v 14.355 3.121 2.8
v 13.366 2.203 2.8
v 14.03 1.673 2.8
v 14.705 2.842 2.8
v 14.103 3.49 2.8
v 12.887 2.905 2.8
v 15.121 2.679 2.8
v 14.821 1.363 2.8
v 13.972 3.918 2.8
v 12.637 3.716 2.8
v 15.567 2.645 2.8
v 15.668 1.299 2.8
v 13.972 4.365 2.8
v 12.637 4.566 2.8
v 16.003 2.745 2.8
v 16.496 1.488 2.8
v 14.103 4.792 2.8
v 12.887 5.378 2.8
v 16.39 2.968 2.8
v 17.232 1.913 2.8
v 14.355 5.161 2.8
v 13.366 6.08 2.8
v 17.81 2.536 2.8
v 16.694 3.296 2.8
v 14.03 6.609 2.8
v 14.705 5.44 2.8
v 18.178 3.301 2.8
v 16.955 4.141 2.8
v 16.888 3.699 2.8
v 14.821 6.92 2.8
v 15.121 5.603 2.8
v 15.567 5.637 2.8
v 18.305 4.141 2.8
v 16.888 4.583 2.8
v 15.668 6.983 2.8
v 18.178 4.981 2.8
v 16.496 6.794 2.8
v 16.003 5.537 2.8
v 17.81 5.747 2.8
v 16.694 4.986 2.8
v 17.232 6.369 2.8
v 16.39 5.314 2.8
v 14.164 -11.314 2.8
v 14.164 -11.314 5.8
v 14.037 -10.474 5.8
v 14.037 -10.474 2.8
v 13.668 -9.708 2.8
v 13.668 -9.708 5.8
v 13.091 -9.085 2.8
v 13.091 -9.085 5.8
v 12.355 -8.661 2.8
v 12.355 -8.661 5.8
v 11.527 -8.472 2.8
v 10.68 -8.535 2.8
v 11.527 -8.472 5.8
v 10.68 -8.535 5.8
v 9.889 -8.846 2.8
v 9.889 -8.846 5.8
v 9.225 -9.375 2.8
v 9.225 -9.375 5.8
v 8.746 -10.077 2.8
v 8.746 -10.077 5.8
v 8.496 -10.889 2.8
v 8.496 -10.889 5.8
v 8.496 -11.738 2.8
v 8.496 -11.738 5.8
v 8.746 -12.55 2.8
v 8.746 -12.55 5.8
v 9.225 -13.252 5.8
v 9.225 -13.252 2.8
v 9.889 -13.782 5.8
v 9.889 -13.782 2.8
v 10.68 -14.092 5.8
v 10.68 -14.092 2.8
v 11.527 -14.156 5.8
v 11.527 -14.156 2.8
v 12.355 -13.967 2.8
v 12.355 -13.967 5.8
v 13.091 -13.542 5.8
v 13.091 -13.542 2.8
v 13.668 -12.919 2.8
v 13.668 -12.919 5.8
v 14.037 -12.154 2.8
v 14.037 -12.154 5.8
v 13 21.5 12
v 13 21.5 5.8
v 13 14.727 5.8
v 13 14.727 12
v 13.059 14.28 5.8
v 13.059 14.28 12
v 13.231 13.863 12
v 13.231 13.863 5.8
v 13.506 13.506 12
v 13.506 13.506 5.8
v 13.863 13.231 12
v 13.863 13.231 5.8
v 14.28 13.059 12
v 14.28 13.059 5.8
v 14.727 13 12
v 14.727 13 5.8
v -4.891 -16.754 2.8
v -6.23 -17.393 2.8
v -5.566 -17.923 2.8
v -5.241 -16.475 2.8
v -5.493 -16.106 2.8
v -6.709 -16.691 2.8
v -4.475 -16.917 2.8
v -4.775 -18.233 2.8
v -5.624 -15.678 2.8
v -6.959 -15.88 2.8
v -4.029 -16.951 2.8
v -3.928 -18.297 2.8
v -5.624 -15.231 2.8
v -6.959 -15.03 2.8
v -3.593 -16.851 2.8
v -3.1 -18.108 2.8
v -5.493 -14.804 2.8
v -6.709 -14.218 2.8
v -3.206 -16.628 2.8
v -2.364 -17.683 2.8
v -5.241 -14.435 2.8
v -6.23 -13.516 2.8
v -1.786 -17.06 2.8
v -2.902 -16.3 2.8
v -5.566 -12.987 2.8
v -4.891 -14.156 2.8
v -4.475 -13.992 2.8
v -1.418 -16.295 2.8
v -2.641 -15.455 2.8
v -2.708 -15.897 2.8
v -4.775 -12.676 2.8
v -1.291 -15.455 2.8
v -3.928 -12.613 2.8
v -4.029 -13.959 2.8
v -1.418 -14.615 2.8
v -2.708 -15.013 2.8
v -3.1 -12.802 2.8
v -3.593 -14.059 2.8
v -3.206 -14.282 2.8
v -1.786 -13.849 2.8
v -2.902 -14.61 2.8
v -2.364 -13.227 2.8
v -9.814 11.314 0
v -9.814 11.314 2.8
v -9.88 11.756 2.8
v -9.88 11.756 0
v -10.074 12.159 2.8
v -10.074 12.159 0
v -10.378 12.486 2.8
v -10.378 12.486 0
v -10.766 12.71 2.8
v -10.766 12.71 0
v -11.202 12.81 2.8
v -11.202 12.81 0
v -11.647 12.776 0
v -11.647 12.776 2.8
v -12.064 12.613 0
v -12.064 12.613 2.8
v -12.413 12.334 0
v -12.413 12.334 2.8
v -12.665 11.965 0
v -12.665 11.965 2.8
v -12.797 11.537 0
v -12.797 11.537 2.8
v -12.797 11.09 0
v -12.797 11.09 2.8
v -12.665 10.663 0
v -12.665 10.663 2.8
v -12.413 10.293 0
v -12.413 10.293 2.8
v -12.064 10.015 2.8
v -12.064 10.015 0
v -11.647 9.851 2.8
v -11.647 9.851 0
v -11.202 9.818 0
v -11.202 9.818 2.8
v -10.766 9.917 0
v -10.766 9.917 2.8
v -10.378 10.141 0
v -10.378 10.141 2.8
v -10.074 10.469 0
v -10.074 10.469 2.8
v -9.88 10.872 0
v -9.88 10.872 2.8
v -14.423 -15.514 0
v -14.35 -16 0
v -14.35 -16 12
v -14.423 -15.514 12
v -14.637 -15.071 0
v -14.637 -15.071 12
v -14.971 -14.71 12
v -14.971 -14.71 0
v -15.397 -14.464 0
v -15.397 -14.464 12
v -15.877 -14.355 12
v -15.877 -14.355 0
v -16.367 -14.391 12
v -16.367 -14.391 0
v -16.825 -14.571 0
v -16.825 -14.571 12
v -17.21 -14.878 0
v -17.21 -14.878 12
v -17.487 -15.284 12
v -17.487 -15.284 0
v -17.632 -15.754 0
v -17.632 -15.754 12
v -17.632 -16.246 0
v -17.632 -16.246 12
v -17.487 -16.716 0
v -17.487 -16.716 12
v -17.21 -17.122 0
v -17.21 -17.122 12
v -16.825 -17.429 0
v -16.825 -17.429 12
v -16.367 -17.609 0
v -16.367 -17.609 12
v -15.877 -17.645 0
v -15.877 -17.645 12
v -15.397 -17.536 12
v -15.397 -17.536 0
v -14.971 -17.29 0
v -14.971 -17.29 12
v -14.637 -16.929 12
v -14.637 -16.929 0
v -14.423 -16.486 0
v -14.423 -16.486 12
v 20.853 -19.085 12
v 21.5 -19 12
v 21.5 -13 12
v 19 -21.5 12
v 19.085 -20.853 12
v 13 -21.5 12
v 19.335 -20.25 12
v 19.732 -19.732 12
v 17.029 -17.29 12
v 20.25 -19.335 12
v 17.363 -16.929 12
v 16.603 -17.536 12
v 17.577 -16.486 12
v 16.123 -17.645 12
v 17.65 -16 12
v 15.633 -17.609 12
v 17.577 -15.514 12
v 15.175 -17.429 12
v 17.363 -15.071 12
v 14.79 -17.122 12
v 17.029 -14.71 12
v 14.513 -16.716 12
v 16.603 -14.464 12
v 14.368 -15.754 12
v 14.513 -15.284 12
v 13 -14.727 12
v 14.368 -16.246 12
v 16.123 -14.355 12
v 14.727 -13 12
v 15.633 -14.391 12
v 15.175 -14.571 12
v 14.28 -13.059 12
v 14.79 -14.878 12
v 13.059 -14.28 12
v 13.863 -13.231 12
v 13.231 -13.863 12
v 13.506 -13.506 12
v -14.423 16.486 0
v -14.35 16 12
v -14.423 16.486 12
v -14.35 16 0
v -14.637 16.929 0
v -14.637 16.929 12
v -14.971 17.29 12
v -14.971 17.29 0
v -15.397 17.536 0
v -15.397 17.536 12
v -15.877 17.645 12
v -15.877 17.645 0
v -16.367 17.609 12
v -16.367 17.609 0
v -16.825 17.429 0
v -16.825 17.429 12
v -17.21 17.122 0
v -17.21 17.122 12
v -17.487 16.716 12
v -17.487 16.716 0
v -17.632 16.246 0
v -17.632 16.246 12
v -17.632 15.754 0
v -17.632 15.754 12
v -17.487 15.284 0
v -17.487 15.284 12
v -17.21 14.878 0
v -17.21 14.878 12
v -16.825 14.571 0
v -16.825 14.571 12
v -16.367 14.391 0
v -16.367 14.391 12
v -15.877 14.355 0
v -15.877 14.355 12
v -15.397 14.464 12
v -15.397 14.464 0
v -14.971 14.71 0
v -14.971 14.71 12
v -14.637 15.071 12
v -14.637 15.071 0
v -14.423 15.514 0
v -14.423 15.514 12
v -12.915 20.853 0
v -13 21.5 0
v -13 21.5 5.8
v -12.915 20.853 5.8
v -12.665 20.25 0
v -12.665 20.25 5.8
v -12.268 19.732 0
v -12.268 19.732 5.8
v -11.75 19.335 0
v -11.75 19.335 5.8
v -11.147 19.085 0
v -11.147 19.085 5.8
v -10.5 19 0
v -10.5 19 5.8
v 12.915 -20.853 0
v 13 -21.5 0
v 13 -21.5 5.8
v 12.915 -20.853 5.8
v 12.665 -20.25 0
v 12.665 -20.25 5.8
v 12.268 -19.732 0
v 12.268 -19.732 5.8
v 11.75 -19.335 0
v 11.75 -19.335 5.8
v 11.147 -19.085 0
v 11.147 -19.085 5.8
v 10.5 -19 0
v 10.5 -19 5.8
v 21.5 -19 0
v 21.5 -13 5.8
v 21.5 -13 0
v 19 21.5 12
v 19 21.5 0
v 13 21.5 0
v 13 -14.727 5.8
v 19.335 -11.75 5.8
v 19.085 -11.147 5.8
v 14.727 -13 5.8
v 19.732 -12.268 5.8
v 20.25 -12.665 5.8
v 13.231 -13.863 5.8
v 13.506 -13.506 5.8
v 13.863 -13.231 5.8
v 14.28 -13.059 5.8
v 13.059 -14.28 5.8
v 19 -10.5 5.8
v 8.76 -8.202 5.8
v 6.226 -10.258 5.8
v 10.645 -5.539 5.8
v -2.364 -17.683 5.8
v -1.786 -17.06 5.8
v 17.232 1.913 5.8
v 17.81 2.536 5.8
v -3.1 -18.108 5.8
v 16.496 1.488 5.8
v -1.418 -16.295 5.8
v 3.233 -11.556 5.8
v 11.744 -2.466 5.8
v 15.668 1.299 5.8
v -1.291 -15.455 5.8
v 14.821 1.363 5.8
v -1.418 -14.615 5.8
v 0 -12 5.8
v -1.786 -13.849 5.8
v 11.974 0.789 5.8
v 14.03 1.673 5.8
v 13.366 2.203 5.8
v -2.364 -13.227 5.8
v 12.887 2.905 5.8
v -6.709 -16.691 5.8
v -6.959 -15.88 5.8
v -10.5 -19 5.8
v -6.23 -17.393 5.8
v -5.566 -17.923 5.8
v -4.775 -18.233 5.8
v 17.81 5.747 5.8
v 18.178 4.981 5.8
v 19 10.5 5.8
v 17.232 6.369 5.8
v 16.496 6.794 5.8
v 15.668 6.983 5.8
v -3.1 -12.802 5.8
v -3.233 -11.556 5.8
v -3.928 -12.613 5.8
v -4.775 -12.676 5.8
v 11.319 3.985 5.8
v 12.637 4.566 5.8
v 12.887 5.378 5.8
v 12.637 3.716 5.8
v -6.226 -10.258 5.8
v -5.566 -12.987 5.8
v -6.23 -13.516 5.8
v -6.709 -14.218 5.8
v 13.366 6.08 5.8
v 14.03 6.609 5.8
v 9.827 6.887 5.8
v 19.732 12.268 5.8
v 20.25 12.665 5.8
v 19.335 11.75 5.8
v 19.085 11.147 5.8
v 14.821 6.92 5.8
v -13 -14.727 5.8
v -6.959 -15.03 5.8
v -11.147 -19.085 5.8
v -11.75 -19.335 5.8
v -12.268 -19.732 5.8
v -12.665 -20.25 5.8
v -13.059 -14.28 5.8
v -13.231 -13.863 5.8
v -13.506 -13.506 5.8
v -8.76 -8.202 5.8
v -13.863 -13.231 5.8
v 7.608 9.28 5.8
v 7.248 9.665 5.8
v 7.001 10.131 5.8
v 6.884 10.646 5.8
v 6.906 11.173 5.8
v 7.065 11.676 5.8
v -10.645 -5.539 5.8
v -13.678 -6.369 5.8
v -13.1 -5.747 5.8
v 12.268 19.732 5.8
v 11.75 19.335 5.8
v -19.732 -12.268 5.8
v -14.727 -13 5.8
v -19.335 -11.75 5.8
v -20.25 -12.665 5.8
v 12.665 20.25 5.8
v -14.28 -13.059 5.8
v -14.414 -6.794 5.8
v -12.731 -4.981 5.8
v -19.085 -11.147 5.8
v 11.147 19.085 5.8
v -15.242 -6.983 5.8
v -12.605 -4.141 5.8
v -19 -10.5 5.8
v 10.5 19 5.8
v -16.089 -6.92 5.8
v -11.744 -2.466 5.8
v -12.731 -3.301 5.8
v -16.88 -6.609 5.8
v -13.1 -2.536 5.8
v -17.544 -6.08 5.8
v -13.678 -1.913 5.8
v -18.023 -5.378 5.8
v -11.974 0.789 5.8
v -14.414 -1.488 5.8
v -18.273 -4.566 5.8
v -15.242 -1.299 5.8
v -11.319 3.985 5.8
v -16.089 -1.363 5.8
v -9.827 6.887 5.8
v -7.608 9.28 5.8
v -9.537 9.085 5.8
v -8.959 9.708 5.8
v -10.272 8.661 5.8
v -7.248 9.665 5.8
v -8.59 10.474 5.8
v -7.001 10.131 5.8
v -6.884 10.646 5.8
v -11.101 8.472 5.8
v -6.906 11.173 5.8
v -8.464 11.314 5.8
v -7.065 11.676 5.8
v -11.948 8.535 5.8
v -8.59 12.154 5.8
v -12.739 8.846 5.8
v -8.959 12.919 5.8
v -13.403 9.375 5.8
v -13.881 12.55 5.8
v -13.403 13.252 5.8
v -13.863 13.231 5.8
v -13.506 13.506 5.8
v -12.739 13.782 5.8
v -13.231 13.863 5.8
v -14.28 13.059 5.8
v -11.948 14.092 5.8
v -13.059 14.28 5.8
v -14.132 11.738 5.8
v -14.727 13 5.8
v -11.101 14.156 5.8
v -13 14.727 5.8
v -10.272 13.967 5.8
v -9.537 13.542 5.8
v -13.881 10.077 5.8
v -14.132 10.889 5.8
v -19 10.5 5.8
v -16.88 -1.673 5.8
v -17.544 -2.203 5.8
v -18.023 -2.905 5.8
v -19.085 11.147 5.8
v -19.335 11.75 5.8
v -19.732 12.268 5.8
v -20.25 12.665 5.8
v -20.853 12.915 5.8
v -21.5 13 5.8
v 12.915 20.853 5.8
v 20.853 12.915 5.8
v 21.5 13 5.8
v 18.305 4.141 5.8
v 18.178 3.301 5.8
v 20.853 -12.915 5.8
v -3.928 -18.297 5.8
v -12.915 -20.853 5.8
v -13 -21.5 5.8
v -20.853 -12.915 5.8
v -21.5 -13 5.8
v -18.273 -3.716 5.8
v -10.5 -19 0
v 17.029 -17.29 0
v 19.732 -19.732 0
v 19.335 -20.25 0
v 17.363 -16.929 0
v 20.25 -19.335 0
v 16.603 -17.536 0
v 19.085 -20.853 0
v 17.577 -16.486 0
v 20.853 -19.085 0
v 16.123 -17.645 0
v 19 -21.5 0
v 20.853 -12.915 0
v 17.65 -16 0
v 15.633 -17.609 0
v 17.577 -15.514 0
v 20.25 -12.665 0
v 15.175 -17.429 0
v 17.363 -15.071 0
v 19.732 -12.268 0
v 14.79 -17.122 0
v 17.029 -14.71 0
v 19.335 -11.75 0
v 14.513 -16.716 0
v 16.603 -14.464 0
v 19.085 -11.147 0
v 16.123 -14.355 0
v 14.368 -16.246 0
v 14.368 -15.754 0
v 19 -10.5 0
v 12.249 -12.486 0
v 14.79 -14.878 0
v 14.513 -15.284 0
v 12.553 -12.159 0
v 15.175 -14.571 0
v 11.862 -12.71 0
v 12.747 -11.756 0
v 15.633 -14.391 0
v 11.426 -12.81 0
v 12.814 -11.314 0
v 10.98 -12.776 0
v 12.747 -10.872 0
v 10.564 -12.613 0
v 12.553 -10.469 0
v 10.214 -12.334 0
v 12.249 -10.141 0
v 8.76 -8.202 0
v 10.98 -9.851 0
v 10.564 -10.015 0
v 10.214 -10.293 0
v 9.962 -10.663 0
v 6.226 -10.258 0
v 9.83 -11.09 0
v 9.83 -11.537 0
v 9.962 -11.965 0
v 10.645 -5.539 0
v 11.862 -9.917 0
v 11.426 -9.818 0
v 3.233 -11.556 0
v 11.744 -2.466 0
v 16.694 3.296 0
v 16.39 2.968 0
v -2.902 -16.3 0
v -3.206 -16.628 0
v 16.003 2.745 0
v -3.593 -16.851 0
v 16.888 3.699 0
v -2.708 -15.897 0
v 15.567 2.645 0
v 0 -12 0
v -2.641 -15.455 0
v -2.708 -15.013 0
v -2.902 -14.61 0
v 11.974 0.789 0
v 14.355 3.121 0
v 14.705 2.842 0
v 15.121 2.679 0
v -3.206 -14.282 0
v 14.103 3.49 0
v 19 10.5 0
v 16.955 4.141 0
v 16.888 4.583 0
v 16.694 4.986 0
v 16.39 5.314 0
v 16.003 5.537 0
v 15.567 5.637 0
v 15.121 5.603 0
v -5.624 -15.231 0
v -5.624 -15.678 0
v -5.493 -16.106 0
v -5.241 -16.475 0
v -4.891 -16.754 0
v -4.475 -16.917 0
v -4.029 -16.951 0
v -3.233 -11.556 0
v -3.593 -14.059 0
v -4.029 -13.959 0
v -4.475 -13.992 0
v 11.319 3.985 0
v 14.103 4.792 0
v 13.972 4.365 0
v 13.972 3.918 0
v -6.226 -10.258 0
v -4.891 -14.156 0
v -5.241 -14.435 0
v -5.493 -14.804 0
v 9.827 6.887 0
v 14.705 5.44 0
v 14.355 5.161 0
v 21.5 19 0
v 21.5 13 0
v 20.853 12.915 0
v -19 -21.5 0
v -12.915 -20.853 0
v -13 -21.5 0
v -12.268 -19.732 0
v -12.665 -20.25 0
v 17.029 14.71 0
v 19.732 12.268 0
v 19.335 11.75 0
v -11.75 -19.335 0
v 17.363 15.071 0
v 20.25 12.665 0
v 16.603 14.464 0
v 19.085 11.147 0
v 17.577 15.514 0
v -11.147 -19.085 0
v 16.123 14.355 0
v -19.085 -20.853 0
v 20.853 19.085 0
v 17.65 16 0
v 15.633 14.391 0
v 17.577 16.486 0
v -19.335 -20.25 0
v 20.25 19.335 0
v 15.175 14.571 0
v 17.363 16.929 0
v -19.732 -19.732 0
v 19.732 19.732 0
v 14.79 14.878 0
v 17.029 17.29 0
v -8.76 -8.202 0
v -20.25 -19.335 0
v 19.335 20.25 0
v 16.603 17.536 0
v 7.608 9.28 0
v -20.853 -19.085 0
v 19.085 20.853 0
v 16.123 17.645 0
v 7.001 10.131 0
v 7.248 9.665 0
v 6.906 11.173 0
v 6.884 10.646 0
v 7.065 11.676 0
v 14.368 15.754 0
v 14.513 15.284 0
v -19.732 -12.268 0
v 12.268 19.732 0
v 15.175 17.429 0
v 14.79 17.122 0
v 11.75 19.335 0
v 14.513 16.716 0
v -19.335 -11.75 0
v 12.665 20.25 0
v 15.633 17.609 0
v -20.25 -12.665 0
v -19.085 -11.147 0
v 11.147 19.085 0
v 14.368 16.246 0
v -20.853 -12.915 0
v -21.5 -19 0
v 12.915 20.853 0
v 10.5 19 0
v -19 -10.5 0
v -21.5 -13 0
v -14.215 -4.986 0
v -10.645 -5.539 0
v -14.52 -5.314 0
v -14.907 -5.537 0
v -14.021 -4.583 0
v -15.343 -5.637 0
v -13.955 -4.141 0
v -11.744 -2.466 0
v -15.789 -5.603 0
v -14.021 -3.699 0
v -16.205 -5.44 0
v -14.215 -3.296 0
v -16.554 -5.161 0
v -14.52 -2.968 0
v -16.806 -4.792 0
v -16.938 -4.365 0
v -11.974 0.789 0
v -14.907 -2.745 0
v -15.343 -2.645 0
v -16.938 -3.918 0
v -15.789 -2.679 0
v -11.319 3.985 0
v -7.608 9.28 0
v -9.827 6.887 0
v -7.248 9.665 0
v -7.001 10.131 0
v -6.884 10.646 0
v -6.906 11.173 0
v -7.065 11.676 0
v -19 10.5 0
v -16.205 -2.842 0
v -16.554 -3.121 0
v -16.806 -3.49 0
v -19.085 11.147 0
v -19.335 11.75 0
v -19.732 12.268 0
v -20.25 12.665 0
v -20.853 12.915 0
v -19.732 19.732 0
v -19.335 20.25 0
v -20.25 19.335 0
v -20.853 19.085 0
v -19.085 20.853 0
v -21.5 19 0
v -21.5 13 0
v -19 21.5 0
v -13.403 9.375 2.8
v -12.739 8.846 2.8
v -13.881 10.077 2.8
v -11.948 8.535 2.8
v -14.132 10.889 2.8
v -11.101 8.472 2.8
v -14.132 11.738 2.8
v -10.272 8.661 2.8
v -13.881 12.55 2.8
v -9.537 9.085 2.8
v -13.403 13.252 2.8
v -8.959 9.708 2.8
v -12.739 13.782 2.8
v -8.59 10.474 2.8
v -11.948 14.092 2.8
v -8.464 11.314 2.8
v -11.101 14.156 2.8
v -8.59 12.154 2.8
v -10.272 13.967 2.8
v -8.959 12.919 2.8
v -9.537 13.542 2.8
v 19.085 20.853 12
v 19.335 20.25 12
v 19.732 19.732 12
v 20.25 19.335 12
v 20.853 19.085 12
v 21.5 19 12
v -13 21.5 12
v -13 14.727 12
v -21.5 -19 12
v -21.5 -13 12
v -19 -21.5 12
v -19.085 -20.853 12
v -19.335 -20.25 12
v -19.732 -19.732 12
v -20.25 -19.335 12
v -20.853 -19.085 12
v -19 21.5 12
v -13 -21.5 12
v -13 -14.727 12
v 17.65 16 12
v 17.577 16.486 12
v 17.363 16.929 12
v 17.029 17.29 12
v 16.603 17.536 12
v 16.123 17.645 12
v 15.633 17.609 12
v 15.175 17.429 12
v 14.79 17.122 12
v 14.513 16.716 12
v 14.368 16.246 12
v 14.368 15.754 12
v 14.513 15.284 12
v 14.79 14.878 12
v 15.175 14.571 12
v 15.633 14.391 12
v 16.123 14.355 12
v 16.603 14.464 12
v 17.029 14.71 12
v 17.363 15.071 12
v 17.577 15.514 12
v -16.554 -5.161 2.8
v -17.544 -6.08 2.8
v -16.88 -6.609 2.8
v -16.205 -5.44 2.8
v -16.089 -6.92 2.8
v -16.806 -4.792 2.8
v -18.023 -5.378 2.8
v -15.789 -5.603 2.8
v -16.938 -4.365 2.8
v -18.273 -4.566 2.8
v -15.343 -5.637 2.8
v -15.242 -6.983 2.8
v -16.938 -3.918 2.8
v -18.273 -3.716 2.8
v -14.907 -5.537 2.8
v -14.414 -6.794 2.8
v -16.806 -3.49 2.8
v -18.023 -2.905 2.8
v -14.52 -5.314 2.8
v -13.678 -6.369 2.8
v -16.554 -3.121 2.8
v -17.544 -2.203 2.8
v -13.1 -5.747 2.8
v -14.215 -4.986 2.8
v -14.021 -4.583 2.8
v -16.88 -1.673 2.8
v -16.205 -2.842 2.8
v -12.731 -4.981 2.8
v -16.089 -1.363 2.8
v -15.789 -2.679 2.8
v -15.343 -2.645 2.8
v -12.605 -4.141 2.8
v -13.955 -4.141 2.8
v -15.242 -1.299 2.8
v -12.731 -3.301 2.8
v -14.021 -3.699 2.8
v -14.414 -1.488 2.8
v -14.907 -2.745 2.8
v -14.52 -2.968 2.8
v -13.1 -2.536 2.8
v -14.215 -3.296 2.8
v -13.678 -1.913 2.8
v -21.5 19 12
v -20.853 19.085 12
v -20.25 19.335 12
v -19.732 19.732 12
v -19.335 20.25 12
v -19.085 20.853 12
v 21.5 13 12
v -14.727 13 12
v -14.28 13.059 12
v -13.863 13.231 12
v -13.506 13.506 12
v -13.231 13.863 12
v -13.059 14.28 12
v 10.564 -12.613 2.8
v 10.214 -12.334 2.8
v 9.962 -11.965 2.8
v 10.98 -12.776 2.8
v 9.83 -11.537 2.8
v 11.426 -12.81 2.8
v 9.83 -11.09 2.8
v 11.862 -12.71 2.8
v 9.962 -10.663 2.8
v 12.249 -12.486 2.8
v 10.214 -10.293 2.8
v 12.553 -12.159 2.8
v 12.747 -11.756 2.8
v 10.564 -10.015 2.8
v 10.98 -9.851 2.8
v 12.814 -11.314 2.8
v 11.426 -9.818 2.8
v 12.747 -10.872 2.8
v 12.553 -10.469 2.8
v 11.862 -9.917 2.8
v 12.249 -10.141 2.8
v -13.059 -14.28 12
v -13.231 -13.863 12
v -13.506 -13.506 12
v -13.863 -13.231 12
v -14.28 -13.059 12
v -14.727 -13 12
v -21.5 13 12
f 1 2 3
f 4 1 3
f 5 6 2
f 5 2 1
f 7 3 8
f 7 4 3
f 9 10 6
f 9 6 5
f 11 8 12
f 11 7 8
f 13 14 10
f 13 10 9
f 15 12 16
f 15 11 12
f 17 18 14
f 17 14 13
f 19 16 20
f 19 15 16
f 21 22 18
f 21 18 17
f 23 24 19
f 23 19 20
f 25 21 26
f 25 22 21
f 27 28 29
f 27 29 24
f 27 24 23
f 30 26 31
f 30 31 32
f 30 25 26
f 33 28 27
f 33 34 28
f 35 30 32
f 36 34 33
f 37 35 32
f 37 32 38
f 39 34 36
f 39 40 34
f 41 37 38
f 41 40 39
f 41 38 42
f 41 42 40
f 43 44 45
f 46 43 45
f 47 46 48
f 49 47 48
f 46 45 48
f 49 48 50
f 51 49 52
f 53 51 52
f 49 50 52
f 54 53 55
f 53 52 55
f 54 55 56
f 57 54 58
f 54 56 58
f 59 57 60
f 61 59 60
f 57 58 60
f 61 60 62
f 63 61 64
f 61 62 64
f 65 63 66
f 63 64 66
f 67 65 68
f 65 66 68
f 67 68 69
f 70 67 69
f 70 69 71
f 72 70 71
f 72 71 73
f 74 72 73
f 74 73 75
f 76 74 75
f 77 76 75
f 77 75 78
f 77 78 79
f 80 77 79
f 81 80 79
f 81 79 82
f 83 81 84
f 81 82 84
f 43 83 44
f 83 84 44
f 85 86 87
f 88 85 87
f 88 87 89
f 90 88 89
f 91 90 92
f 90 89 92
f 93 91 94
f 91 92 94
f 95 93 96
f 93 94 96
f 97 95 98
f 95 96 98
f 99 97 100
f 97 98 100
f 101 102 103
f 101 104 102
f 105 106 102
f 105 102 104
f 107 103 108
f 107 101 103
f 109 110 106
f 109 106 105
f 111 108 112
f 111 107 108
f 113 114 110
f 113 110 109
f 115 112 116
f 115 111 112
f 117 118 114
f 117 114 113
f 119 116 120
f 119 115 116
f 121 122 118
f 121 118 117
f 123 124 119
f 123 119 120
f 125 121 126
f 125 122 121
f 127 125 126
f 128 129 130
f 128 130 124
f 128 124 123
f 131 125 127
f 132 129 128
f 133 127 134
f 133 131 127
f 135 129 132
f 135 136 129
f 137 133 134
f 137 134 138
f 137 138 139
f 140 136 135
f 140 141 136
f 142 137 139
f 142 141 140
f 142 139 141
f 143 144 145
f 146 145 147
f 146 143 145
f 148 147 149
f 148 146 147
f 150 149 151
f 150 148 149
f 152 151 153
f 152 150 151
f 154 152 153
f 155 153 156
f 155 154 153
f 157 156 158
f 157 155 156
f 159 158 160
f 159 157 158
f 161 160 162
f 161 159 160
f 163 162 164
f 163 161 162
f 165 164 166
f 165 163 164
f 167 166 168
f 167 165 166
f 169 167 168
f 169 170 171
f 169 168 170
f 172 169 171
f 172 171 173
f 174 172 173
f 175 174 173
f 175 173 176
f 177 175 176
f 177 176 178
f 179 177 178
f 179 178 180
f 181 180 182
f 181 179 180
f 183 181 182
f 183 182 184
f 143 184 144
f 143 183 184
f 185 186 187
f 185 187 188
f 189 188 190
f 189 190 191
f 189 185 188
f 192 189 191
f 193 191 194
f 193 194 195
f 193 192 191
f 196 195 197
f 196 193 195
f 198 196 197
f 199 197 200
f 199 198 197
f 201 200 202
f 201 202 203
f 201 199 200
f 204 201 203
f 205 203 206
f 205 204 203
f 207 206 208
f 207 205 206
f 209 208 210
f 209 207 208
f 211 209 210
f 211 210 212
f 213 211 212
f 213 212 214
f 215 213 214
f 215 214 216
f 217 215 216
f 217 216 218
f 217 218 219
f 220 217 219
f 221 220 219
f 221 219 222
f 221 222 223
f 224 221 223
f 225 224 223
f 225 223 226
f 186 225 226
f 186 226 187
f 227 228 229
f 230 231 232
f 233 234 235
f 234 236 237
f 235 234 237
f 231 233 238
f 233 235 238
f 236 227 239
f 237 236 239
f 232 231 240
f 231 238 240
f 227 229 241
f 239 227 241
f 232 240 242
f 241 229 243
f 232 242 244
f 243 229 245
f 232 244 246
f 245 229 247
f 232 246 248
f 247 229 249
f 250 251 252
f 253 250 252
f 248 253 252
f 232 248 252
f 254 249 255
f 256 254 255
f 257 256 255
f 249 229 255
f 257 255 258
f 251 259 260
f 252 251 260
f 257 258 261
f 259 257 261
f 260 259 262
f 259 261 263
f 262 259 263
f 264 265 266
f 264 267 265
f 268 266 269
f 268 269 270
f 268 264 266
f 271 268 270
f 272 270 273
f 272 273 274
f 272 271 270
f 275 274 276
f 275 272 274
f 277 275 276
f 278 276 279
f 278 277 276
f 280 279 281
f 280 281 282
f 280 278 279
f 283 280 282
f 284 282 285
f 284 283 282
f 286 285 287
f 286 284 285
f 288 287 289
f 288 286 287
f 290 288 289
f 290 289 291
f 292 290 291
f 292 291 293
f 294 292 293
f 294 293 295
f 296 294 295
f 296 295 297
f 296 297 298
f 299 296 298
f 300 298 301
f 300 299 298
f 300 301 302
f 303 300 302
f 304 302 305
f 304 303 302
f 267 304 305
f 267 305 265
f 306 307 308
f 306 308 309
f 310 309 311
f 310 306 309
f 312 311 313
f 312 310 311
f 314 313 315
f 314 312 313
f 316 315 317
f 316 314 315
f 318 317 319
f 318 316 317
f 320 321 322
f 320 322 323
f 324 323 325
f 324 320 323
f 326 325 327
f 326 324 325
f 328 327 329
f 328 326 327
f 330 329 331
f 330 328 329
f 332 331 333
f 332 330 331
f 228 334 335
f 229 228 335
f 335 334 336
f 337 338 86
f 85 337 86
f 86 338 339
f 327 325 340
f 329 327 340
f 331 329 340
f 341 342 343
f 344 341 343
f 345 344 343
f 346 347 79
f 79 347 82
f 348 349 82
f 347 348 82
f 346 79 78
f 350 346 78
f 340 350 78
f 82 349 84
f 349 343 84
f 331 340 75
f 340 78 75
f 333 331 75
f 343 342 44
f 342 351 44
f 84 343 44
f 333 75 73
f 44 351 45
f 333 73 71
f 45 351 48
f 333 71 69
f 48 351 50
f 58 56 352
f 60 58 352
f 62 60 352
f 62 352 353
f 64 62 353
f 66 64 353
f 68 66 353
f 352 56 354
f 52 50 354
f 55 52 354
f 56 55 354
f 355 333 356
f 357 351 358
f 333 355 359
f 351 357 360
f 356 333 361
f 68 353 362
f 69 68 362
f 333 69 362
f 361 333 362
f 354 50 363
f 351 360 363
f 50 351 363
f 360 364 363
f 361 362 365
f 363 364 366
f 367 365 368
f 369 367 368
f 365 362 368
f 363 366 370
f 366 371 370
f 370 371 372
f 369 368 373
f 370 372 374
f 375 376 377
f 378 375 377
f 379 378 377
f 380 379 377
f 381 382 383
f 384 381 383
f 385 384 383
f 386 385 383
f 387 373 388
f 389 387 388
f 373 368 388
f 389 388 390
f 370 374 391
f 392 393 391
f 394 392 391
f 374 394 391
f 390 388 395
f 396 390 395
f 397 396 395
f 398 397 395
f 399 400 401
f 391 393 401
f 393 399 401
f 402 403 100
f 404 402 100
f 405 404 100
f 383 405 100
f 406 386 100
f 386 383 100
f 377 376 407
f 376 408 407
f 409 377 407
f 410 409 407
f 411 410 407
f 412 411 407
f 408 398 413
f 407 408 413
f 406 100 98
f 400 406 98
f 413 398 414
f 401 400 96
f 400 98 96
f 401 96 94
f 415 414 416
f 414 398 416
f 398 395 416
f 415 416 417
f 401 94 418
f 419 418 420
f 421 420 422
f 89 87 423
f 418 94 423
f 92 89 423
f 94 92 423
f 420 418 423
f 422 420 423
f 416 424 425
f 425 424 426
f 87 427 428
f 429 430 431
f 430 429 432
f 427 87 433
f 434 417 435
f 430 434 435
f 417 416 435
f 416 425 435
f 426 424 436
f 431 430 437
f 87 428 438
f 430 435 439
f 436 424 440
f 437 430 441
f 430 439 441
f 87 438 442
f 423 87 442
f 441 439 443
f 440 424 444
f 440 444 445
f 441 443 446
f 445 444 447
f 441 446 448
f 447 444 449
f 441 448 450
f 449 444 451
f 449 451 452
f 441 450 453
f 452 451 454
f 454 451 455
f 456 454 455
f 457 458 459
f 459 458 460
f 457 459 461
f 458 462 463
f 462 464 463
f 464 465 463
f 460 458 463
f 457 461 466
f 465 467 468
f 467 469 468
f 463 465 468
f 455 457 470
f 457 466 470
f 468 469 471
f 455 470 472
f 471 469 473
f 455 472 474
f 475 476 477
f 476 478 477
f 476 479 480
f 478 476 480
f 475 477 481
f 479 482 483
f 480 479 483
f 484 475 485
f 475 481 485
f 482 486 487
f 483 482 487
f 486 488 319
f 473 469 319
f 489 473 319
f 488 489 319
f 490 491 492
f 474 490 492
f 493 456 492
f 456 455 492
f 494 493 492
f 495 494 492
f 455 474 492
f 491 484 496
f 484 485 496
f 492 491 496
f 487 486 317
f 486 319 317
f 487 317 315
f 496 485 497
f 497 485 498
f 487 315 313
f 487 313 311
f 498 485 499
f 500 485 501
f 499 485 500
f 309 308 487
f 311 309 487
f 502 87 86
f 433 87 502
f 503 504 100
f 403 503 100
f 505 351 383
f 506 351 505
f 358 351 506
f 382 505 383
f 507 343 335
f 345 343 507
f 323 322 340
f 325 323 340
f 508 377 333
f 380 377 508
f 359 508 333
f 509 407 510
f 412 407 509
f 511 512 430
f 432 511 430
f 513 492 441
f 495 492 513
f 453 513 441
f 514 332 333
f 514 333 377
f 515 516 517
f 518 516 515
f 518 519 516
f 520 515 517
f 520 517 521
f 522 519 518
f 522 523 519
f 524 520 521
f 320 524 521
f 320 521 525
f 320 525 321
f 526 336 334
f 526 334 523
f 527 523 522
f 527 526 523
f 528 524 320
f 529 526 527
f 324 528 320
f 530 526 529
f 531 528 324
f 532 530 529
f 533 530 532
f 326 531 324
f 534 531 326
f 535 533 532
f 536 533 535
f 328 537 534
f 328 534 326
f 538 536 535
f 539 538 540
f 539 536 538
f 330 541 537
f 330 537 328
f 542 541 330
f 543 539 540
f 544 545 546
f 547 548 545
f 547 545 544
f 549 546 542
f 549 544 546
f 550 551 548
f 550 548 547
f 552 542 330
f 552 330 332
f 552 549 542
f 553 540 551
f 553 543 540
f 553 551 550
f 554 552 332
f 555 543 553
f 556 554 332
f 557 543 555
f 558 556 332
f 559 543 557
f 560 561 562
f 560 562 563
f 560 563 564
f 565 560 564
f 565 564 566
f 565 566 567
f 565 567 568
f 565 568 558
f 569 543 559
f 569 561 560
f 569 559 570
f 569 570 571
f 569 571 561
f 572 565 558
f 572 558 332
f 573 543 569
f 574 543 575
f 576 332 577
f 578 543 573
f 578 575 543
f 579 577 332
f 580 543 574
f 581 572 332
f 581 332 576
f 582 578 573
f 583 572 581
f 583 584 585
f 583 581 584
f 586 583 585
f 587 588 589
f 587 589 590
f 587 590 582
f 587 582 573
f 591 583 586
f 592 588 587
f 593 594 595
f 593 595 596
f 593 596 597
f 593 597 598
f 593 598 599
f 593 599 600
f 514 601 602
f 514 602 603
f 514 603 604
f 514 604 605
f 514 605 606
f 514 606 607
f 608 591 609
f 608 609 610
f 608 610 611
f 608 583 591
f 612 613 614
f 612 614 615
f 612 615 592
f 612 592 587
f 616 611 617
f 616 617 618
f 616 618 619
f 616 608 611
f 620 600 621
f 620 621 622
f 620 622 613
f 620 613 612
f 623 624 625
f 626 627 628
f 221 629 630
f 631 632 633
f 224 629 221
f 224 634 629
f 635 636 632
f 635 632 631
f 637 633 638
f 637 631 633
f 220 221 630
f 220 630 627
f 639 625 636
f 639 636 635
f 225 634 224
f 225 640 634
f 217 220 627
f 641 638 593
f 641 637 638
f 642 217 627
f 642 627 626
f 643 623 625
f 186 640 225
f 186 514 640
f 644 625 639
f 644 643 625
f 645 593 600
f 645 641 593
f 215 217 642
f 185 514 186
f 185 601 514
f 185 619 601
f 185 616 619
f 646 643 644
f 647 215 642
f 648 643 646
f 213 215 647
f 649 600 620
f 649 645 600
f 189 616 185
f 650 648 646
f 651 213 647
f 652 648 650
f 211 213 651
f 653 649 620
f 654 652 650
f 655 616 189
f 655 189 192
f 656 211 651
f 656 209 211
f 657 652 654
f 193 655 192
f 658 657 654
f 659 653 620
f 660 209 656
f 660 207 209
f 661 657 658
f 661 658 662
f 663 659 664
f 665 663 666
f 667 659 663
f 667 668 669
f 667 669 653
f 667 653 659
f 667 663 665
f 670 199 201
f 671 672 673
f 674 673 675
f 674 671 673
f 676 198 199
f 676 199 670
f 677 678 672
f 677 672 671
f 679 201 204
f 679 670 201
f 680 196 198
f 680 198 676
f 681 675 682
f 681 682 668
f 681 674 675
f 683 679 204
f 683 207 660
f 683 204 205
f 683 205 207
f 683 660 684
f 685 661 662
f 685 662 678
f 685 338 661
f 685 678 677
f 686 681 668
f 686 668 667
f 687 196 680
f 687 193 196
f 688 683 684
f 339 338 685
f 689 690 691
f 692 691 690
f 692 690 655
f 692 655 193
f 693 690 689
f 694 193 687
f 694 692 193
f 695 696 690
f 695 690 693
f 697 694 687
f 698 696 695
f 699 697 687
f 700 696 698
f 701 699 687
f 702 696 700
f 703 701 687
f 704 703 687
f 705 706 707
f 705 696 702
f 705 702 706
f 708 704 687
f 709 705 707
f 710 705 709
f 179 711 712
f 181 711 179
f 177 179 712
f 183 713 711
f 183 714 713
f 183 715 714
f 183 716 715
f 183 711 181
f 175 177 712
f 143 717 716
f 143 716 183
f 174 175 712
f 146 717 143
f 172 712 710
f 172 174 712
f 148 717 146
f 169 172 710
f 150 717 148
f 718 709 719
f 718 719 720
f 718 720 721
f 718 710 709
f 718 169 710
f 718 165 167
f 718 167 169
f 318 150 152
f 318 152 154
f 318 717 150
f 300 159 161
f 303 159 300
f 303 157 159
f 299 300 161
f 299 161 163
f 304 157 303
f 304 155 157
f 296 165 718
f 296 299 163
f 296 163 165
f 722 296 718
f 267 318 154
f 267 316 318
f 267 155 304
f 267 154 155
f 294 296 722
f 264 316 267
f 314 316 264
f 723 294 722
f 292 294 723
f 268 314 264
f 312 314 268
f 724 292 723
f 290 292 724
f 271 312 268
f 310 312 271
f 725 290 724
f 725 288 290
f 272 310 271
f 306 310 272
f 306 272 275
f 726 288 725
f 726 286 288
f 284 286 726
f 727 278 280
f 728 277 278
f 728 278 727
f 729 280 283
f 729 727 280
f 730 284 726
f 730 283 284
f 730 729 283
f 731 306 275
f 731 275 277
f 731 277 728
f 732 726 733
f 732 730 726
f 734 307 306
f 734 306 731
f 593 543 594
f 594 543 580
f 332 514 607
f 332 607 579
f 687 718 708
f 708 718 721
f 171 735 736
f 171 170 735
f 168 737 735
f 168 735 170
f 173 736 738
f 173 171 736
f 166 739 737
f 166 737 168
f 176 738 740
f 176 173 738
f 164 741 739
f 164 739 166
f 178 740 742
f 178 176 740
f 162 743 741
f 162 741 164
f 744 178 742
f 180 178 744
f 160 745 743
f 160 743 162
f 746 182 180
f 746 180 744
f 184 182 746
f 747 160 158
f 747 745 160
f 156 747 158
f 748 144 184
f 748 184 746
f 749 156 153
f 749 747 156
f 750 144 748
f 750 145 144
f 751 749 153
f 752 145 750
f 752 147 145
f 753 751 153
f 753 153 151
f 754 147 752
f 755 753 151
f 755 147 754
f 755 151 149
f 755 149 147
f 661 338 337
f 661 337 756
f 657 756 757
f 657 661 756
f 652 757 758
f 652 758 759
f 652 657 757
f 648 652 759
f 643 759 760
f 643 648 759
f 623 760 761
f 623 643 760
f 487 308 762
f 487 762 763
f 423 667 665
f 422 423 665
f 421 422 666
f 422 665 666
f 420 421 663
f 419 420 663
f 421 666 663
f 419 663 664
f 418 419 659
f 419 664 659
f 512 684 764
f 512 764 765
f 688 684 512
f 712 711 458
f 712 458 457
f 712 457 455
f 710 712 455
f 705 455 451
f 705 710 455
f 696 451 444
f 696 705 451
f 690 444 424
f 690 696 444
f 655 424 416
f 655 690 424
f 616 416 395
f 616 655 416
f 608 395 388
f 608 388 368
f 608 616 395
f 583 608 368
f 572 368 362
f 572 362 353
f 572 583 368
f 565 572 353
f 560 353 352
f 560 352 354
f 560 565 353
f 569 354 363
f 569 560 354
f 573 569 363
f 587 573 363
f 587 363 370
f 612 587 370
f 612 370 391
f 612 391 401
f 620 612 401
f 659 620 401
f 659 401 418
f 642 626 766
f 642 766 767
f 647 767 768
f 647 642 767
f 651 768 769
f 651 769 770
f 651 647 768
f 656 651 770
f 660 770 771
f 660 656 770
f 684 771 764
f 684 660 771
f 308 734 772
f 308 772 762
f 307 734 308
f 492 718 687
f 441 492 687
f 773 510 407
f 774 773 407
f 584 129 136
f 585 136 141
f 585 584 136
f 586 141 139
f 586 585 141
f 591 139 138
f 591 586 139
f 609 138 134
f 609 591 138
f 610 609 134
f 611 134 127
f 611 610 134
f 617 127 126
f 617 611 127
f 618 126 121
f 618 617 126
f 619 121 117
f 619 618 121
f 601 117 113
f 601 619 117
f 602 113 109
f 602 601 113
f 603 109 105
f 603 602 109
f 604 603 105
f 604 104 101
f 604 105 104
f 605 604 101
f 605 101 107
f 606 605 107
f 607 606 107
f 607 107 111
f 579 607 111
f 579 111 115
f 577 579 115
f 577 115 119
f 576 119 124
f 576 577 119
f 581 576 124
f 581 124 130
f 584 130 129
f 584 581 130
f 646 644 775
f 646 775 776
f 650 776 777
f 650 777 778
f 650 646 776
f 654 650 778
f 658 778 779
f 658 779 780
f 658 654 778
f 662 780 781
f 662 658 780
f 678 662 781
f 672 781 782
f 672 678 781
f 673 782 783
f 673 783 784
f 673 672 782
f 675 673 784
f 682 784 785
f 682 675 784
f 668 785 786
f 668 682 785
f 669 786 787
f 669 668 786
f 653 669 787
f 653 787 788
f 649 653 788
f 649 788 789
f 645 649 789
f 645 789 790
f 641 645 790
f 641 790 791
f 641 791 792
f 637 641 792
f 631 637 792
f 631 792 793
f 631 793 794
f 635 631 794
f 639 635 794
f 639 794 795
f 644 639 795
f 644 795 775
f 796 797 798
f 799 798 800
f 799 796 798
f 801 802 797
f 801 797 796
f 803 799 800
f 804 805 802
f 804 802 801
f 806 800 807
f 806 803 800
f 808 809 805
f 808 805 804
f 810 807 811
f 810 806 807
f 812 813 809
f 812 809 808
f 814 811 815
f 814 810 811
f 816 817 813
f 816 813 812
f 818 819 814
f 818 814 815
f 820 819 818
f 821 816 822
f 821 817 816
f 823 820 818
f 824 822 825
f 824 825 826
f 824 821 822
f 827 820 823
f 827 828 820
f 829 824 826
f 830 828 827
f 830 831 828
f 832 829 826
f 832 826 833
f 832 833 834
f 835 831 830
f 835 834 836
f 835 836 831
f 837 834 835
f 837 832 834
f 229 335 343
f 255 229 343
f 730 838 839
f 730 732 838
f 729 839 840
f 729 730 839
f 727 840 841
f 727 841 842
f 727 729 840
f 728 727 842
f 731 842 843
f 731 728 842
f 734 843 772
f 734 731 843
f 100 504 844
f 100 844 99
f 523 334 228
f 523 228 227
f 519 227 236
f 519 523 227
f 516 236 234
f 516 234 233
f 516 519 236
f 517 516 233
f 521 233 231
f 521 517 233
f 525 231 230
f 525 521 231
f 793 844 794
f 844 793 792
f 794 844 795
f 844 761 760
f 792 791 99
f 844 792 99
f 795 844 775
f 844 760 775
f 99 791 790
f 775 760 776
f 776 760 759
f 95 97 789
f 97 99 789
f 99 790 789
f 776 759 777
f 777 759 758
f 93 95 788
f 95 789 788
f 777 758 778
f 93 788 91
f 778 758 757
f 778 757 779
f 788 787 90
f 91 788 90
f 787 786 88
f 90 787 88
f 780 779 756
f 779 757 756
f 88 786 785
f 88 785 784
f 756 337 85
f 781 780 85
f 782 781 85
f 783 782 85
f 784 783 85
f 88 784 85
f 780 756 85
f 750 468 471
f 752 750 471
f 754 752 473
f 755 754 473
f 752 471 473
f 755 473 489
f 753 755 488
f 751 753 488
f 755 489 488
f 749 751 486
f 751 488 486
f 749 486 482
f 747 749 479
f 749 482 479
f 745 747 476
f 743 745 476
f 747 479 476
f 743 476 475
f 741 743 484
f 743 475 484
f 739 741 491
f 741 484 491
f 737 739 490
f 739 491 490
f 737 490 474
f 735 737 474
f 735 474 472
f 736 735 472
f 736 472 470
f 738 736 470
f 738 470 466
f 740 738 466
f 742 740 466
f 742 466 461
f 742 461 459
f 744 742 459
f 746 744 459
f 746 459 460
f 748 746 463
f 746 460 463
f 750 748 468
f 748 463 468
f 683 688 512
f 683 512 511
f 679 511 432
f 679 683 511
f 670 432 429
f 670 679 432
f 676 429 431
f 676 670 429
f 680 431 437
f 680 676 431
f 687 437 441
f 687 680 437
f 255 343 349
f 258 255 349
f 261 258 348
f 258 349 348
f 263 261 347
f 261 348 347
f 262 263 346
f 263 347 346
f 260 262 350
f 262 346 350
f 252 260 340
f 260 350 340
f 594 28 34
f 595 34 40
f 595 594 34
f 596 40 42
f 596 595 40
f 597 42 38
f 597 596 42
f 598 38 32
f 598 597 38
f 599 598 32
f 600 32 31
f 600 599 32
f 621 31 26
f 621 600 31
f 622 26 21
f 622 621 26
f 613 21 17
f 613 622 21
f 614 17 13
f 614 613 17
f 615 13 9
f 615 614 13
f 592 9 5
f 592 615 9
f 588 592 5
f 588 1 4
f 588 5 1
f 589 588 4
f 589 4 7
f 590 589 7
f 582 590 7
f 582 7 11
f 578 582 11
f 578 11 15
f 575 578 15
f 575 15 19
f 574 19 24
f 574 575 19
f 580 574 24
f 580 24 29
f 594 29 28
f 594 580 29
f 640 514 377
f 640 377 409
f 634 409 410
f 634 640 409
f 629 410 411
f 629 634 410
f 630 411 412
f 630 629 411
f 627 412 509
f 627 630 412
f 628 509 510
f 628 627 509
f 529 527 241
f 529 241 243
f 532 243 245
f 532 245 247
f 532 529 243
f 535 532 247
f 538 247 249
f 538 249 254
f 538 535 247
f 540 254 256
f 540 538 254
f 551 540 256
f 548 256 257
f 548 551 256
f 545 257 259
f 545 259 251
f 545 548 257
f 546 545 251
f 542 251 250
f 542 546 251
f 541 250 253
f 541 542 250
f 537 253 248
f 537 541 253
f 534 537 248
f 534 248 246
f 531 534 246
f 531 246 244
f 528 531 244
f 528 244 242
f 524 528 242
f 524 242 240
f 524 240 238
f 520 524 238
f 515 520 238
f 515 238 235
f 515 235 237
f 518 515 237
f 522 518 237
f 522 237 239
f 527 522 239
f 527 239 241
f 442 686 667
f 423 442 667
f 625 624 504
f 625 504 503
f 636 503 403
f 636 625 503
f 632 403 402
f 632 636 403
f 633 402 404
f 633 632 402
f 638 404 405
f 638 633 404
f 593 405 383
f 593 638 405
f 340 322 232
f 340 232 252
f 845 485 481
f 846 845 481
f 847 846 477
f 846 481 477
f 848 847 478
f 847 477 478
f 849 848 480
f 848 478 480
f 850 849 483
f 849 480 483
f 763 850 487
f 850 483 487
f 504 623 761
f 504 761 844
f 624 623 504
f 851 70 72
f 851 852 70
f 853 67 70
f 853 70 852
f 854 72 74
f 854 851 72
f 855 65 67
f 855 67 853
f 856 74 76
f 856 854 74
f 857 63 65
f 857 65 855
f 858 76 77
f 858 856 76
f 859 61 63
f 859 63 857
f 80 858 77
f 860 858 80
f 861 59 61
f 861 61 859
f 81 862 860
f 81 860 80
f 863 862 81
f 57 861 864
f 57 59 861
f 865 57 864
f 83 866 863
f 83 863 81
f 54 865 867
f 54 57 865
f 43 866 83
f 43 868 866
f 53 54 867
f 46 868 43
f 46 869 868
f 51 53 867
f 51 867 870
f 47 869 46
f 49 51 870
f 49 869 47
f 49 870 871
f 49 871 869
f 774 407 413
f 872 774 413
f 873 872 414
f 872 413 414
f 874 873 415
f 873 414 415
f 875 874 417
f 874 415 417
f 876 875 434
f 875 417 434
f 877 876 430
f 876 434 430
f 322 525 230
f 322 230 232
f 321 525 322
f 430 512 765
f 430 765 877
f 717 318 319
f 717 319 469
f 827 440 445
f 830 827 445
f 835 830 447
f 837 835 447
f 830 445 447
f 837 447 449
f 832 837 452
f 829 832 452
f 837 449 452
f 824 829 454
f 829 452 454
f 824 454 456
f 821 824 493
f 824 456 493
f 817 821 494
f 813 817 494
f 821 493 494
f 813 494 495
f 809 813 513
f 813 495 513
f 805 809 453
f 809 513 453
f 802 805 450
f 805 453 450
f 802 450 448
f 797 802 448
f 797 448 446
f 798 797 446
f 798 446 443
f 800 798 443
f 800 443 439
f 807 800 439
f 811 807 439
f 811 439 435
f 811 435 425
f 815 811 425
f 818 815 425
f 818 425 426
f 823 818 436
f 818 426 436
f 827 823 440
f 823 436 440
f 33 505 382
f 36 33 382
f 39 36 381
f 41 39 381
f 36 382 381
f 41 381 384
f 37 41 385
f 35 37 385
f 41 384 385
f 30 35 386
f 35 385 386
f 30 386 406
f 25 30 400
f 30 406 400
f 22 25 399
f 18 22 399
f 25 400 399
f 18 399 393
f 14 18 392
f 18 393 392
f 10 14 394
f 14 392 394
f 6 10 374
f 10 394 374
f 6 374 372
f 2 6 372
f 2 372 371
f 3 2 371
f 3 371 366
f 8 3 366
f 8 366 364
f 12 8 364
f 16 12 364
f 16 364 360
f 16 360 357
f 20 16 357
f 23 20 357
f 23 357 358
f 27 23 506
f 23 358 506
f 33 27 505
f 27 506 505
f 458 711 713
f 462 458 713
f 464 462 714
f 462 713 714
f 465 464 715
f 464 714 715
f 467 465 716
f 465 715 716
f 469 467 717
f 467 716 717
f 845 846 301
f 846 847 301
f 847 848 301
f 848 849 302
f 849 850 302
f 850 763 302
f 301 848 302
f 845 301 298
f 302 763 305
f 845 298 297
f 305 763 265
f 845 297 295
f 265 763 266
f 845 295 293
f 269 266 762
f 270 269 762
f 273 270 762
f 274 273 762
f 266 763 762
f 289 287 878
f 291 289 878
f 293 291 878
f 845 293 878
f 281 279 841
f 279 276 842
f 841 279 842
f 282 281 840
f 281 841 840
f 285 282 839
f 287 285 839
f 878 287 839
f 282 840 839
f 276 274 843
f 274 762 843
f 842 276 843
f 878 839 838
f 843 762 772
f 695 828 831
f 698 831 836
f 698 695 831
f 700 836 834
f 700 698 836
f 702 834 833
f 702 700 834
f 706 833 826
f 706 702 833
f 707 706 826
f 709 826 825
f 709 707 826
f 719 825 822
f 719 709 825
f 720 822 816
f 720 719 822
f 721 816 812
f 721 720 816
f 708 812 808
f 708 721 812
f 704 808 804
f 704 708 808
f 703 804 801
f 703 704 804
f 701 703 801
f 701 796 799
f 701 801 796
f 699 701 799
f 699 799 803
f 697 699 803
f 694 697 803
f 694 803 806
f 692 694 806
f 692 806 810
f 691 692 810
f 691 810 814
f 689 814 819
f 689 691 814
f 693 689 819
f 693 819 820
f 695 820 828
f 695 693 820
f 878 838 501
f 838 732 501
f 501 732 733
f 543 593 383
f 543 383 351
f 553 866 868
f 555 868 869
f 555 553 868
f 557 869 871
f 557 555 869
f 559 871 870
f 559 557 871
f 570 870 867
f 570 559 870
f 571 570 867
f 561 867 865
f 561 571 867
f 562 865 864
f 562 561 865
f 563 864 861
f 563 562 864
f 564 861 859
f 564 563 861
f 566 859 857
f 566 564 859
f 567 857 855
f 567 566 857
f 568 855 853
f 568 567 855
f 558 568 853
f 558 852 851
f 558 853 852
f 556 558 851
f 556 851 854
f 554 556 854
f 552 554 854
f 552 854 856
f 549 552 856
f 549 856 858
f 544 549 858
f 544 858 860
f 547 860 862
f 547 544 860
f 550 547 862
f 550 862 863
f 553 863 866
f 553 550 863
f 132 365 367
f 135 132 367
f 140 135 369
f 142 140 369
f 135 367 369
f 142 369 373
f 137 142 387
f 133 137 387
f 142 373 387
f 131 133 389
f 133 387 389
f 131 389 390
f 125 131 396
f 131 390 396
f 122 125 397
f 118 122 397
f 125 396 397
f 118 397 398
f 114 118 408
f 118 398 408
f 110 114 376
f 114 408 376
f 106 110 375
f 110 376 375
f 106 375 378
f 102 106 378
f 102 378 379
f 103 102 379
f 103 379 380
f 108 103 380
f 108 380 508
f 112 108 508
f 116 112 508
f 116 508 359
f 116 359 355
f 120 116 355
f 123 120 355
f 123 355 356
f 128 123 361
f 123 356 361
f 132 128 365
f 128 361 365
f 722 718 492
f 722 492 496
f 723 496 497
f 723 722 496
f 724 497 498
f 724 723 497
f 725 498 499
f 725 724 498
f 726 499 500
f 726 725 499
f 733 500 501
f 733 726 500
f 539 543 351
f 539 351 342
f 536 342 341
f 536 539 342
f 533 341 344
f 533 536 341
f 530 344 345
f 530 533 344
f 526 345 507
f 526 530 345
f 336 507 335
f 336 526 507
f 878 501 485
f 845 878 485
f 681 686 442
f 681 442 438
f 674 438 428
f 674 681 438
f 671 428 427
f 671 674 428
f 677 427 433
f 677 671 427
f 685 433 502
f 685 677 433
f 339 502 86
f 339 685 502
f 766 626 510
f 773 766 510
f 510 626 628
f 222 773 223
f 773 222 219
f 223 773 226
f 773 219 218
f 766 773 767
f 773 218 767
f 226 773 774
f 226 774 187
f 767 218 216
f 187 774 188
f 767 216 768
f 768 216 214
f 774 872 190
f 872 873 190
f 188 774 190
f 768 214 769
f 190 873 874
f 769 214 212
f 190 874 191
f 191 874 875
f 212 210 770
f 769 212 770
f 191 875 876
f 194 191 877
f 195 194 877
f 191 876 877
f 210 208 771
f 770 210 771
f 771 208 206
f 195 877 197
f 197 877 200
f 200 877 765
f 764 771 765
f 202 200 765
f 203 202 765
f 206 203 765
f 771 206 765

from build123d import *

# Parameters (mm, degrees)
SKETCH_R     = 1.5
SKETCH_R_2   = 1.65
PAD_DEPTH    = 5.8
SKETCH001_R  = 1.65
PAD001_DEPTH = 6.2
SKETCH002_R  = 2.85
POCKET_DEPTH = 3


with BuildPart() as part:
    # Sketch → Pad (new body)
    with BuildSketch(Plane.XY):
        with BuildLine():
            ThreePointArc((-21.5, 19), (-19.732233, 19.732233), (-19, 21.5))
            Line((-19, 21.5), (-13, 21.5))
            ThreePointArc((-13, 21.5), (-12.267767, 19.732233), (-10.500001, 19))
            Line((-10.500001, 19), (-7.065457, 11.675563))
            ThreePointArc((-7.608223, 9.279814), (-6.925691, 10.384542), (-7.065457, 11.675563))
            ThreePointArc((-7.608223, 9.279814), (0, -12), (7.608223, 9.279814))
            ThreePointArc((7.065457, 11.675563), (6.925691, 10.384541), (7.608223, 9.279814))
            Line((10.500001, 19), (7.065457, 11.675563))
            ThreePointArc((10.500001, 19), (12.267767, 19.732233), (13, 21.5))
            Line((19, 21.5), (13, 21.5))
            ThreePointArc((19, 21.5), (19.732233, 19.732233), (21.5, 19))
            Line((21.5, 19), (21.5, 13))
            ThreePointArc((21.5, 13), (19.732233, 12.267767), (19, 10.500001))
            Line((19, 10.500001), (19, -10.500001))
            ThreePointArc((19, -10.500001), (19.732233, -12.267767), (21.5, -13))
            Line((21.5, -19), (21.5, -13))
            ThreePointArc((21.5, -19), (19.732233, -19.732233), (19, -21.5))
            Line((19, -21.5), (13, -21.5))
            ThreePointArc((13, -21.5), (12.267767, -19.732233), (10.500001, -19))
            Line((10.500001, -19), (-10.500001, -19))
            ThreePointArc((-10.500001, -19), (-12.267767, -19.732233), (-13, -21.5))
            Line((-19, -21.5), (-13, -21.5))
            ThreePointArc((-19, -21.5), (-19.732233, -19.732233), (-21.5, -19))
            Line((-21.5, -19), (-21.5, -13))
            ThreePointArc((-21.5, -13), (-19.732233, -12.267767), (-19, -10.500001))
            Line((-19, 10.500001), (-19, -10.500001))
            ThreePointArc((-19, 10.500001), (-19.732233, 12.267767), (-21.5, 13))
            Line((-21.5, 19), (-21.5, 13))
        make_face()
        with Locations((-11.313708, 11.313708)):
            Circle(SKETCH_R, mode=Mode.SUBTRACT)
        with Locations((-15.454813, -4.141105)):
            Circle(SKETCH_R, mode=Mode.SUBTRACT)
        with Locations((-4.141105, -15.454813)):
            Circle(SKETCH_R, mode=Mode.SUBTRACT)
        with Locations((11.313708, -11.313708)):
            Circle(SKETCH_R, mode=Mode.SUBTRACT)
        with Locations((15.454813, 4.141105)):
            Circle(SKETCH_R, mode=Mode.SUBTRACT)
        with Locations((-16, 16)):
            Circle(SKETCH_R_2, mode=Mode.SUBTRACT)
        with Locations((16, 16)):
            Circle(SKETCH_R_2, mode=Mode.SUBTRACT)
        with Locations((16, -16)):
            Circle(SKETCH_R_2, mode=Mode.SUBTRACT)
        with Locations((-16, -16)):
            Circle(SKETCH_R_2, mode=Mode.SUBTRACT)
    extrude(amount=PAD_DEPTH)

    # Sketch001 (on Face39 of Pad) → Pad001 (join)
    with BuildSketch(Plane.XY.offset(5.8)):
        with BuildLine():
            ThreePointArc((-21.5, 19), (-19.732233, 19.732233), (-19, 21.5))
            Line((-19, 21.5), (-13, 21.5))
            Line((-13, 21.5), (-13, 14.726703))
            ThreePointArc((-14.726703, 13), (-13.50574, 13.50574), (-13, 14.726703))
            Line((-21.5, 13), (-14.726703, 13))
            Line((-21.5, 19), (-21.5, 13))
        make_face()
        with Locations((-16, 16)):
            Circle(SKETCH001_R, mode=Mode.SUBTRACT)
        with BuildLine():
            ThreePointArc((-19, -21.5), (-19.732233, -19.732233), (-21.5, -19))
            Line((-21.5, -19), (-21.5, -13))
            Line((-21.5, -13), (-14.726703, -13))
            ThreePointArc((-13, -14.726703), (-13.50574, -13.50574), (-14.726703, -13))
            Line((-13, -21.5), (-13, -14.726703))
            Line((-19, -21.5), (-13, -21.5))
        make_face()
        with Locations((-16, -16)):
            Circle(SKETCH001_R, mode=Mode.SUBTRACT)
        with BuildLine():
            ThreePointArc((21.5, -19), (19.732233, -19.732233), (19, -21.5))
            Line((19, -21.5), (13, -21.5))
            Line((13, -21.5), (13, -14.726703))
            ThreePointArc((14.726703, -13), (13.50574, -13.50574), (13, -14.726703))
            Line((21.5, -13), (14.726703, -13))
            Line((21.5, -19), (21.5, -13))
        make_face()
        with Locations((16, -16)):
            Circle(SKETCH001_R, mode=Mode.SUBTRACT)
        with BuildLine():
            ThreePointArc((19, 21.5), (19.732233, 19.732233), (21.5, 19))
            Line((21.5, 19), (21.5, 13))
            Line((21.5, 13), (14.726703, 13))
            ThreePointArc((13, 14.726703), (13.50574, 13.50574), (14.726703, 13))
            Line((13, 21.5), (13, 14.726703))
            Line((19, 21.5), (13, 21.5))
        make_face()
        with Locations((16, 16)):
            Circle(SKETCH001_R, mode=Mode.SUBTRACT)
    extrude(amount=PAD001_DEPTH)

    # Sketch002 (on Face4 of Pad001) → Pocket (cut)
    with BuildSketch(Plane.XY.offset(5.8)):
        with Locations((-11.313708, 11.313708)):
            Circle(SKETCH002_R)
        with Locations((15.454813, 4.141105)):
            Circle(SKETCH002_R)
        with Locations((11.313708, -11.313708)):
            Circle(SKETCH002_R)
        with Locations((-4.141105, -15.454813)):
            Circle(SKETCH002_R)
        with Locations((-15.454813, -4.141105)):
            Circle(SKETCH002_R)
    extrude(amount=-POCKET_DEPTH, mode=Mode.SUBTRACT)


solid = part.part
